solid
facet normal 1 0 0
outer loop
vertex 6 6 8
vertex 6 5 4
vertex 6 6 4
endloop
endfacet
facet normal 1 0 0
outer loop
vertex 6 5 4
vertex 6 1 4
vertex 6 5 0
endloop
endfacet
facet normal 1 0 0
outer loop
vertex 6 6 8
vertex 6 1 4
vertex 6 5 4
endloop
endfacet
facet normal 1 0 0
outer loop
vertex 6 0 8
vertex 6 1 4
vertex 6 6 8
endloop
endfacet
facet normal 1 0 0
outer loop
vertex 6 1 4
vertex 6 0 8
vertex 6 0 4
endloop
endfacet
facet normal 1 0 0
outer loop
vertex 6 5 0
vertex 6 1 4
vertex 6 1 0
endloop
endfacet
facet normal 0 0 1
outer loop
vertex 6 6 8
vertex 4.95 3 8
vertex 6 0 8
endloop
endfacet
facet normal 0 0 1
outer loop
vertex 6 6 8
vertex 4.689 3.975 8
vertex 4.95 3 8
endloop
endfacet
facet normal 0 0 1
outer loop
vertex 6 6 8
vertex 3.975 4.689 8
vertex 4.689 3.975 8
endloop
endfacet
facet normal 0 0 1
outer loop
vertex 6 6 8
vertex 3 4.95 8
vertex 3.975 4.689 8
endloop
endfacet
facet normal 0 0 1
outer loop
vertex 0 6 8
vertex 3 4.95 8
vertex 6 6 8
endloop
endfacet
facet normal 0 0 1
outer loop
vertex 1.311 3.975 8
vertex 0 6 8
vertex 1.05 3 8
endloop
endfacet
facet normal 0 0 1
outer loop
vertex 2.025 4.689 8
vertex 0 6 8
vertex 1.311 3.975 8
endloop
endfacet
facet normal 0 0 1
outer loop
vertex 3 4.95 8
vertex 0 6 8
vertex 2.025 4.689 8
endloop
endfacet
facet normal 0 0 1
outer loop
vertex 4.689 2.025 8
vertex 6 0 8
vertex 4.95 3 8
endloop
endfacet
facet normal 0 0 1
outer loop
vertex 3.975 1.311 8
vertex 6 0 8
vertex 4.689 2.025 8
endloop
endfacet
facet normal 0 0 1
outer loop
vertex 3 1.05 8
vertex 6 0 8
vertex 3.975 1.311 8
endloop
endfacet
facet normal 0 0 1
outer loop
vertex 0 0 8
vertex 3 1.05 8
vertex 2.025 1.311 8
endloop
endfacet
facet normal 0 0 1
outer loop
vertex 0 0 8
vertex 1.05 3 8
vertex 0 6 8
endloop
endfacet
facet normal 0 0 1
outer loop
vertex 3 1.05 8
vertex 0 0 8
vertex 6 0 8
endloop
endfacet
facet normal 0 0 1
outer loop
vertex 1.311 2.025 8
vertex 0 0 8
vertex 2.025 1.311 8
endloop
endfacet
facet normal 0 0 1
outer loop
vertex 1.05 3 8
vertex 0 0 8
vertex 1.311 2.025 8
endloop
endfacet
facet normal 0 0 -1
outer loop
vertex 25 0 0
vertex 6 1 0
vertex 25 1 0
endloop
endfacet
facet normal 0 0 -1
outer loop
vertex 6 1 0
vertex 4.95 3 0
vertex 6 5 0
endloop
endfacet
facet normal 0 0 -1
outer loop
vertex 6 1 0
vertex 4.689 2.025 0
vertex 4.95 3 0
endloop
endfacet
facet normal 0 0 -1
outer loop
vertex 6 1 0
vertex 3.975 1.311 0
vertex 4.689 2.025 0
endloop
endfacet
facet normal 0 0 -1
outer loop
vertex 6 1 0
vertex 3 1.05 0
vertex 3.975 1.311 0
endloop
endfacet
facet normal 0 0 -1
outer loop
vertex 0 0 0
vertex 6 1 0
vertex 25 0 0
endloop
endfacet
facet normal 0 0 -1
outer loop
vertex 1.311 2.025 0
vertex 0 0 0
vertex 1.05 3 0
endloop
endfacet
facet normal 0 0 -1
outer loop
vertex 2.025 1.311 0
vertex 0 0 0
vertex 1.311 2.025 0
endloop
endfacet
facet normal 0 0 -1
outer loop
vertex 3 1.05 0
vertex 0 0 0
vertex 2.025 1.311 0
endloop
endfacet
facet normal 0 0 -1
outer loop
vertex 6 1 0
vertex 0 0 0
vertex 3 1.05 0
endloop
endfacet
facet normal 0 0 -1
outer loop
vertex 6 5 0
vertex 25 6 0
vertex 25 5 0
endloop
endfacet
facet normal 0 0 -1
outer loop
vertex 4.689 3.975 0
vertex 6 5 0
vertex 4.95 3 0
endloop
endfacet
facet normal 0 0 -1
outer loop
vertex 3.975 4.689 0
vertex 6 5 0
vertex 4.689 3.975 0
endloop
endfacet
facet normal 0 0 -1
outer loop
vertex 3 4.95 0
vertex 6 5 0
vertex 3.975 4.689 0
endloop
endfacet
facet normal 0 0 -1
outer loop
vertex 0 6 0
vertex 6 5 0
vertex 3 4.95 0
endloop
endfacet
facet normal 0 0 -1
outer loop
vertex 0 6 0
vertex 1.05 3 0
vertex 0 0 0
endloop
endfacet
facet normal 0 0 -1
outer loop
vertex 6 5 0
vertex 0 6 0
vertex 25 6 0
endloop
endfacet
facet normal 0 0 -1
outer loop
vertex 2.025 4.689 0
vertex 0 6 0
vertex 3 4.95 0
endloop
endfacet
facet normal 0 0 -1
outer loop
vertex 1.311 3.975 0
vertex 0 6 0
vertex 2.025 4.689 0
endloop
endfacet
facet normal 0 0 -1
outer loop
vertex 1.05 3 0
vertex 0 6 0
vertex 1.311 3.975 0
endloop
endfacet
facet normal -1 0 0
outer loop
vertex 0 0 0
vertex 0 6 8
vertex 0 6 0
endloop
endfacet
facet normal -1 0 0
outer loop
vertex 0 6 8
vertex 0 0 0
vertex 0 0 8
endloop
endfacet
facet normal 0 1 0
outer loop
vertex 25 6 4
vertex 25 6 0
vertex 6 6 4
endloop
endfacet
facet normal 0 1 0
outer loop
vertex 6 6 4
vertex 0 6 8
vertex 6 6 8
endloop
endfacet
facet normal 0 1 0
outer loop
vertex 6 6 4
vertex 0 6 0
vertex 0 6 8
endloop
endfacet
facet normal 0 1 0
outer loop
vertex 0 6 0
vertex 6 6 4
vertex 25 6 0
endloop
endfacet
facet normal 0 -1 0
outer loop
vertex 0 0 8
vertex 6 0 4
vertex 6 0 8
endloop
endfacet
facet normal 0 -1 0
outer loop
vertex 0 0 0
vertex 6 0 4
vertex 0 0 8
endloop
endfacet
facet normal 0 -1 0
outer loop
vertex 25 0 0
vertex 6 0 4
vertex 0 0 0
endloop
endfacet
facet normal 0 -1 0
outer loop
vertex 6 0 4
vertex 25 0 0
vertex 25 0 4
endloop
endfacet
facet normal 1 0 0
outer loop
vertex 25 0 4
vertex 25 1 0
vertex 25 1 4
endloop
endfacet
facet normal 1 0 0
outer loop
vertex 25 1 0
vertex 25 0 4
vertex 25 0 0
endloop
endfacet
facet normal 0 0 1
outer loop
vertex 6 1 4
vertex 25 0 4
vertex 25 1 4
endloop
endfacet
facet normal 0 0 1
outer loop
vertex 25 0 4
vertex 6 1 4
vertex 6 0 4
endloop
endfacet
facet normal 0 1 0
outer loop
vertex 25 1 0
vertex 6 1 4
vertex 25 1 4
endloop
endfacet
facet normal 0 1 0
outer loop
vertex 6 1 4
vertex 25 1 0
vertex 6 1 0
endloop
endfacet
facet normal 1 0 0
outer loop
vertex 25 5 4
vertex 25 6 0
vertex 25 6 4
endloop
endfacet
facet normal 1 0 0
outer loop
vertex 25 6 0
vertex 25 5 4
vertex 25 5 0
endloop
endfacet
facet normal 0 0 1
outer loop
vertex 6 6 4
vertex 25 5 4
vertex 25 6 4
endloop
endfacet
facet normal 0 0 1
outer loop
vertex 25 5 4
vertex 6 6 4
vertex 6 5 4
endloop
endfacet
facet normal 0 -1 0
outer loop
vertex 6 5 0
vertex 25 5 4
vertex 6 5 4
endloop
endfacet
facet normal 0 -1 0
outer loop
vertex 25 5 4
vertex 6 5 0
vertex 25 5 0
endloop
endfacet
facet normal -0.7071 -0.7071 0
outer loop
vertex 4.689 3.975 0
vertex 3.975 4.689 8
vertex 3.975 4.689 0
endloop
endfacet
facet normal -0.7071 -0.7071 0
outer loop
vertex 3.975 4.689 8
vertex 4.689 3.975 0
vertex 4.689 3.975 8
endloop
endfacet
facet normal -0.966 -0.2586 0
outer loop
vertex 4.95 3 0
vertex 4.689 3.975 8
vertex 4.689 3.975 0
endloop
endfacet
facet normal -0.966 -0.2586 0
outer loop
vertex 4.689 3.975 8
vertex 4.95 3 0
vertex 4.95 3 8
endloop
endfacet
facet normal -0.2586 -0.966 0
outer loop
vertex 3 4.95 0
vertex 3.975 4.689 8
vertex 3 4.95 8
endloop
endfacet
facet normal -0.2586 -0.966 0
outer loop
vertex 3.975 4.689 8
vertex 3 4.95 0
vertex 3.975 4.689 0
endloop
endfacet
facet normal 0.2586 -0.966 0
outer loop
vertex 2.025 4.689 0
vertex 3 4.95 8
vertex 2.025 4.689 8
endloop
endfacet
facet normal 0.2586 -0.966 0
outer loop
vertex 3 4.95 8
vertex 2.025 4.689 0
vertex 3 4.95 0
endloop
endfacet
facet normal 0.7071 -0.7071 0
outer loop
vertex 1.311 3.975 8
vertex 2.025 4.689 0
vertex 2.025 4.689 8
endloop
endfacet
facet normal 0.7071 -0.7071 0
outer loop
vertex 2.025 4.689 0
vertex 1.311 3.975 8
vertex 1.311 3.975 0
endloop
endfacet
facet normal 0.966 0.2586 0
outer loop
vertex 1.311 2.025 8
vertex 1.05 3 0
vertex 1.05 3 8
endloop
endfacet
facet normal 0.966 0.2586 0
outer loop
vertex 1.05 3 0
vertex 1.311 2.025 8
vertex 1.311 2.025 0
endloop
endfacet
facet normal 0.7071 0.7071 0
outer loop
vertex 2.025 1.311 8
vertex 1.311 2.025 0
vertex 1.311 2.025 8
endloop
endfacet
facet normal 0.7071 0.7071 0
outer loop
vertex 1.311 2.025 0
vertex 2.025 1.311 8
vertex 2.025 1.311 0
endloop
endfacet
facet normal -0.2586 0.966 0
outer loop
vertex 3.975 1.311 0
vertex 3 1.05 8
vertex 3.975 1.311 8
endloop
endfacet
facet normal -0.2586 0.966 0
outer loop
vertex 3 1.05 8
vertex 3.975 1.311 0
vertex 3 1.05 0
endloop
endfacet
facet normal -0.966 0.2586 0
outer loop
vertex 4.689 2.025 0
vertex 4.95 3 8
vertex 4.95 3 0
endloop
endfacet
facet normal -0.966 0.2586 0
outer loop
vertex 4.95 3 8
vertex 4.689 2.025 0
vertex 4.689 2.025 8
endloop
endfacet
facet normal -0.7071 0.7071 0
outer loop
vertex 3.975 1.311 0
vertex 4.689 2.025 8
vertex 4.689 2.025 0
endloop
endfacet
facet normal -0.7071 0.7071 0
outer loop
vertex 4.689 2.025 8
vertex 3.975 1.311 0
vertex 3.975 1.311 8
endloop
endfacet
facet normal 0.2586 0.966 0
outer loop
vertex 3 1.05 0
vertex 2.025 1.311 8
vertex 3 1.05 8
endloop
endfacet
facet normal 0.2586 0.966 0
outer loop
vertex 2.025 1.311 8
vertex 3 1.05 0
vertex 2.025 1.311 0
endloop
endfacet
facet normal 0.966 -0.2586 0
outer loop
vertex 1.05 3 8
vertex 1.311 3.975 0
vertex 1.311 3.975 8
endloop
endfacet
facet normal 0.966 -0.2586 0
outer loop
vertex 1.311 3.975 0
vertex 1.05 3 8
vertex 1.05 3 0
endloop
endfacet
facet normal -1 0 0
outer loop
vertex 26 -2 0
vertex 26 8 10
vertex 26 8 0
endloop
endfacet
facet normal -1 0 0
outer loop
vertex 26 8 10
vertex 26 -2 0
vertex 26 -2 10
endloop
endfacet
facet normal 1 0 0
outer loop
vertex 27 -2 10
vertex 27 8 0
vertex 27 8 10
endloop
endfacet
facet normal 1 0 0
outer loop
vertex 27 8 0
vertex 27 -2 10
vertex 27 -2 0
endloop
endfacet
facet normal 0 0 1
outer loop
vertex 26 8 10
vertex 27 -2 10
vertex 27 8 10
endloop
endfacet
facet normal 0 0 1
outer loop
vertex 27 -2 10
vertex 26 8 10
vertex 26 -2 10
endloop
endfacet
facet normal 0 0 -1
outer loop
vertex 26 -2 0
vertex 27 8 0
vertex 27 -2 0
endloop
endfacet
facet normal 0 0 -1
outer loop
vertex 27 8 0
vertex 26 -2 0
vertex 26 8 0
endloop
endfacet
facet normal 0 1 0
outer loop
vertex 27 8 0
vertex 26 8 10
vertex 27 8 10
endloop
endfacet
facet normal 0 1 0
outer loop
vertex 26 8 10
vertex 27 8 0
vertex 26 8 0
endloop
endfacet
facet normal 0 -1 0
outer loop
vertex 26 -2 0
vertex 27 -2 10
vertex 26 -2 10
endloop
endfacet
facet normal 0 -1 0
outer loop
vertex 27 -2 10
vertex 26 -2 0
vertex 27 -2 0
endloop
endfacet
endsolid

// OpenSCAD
difference() {
  union() {
    cube([6,6,8]);
/*    translate([0,4,0]) {
      cube([4,2,8]);
    }*/
    
    cube([25,1,4]);
    translate([0,5,0]) {
      cube([25,1,4]);
    }
  }
  translate([3,3,-1]) {
    cylinder(h = 14, d = 3.9, $fn=12);
  }
}

translate([25,0,0]) {
  polyhedron(points = [[0,0,0],[0,6,0],[0,0,4],[0,6,4],[1,-2,0],[1,8,0],[1,-2,10],[1,8,10]], faces = [[0,1,2],[1,2,3],[0,2,4],[2,4,6],[1,3,5],[3,5,7],[0,1,4],[1,4,5],[2,3,6],[3,6,7],[4,5,6],[5,6,7]]);
  translate([1,-2,0]) {
    cube([1,10,10]);
  }
}
